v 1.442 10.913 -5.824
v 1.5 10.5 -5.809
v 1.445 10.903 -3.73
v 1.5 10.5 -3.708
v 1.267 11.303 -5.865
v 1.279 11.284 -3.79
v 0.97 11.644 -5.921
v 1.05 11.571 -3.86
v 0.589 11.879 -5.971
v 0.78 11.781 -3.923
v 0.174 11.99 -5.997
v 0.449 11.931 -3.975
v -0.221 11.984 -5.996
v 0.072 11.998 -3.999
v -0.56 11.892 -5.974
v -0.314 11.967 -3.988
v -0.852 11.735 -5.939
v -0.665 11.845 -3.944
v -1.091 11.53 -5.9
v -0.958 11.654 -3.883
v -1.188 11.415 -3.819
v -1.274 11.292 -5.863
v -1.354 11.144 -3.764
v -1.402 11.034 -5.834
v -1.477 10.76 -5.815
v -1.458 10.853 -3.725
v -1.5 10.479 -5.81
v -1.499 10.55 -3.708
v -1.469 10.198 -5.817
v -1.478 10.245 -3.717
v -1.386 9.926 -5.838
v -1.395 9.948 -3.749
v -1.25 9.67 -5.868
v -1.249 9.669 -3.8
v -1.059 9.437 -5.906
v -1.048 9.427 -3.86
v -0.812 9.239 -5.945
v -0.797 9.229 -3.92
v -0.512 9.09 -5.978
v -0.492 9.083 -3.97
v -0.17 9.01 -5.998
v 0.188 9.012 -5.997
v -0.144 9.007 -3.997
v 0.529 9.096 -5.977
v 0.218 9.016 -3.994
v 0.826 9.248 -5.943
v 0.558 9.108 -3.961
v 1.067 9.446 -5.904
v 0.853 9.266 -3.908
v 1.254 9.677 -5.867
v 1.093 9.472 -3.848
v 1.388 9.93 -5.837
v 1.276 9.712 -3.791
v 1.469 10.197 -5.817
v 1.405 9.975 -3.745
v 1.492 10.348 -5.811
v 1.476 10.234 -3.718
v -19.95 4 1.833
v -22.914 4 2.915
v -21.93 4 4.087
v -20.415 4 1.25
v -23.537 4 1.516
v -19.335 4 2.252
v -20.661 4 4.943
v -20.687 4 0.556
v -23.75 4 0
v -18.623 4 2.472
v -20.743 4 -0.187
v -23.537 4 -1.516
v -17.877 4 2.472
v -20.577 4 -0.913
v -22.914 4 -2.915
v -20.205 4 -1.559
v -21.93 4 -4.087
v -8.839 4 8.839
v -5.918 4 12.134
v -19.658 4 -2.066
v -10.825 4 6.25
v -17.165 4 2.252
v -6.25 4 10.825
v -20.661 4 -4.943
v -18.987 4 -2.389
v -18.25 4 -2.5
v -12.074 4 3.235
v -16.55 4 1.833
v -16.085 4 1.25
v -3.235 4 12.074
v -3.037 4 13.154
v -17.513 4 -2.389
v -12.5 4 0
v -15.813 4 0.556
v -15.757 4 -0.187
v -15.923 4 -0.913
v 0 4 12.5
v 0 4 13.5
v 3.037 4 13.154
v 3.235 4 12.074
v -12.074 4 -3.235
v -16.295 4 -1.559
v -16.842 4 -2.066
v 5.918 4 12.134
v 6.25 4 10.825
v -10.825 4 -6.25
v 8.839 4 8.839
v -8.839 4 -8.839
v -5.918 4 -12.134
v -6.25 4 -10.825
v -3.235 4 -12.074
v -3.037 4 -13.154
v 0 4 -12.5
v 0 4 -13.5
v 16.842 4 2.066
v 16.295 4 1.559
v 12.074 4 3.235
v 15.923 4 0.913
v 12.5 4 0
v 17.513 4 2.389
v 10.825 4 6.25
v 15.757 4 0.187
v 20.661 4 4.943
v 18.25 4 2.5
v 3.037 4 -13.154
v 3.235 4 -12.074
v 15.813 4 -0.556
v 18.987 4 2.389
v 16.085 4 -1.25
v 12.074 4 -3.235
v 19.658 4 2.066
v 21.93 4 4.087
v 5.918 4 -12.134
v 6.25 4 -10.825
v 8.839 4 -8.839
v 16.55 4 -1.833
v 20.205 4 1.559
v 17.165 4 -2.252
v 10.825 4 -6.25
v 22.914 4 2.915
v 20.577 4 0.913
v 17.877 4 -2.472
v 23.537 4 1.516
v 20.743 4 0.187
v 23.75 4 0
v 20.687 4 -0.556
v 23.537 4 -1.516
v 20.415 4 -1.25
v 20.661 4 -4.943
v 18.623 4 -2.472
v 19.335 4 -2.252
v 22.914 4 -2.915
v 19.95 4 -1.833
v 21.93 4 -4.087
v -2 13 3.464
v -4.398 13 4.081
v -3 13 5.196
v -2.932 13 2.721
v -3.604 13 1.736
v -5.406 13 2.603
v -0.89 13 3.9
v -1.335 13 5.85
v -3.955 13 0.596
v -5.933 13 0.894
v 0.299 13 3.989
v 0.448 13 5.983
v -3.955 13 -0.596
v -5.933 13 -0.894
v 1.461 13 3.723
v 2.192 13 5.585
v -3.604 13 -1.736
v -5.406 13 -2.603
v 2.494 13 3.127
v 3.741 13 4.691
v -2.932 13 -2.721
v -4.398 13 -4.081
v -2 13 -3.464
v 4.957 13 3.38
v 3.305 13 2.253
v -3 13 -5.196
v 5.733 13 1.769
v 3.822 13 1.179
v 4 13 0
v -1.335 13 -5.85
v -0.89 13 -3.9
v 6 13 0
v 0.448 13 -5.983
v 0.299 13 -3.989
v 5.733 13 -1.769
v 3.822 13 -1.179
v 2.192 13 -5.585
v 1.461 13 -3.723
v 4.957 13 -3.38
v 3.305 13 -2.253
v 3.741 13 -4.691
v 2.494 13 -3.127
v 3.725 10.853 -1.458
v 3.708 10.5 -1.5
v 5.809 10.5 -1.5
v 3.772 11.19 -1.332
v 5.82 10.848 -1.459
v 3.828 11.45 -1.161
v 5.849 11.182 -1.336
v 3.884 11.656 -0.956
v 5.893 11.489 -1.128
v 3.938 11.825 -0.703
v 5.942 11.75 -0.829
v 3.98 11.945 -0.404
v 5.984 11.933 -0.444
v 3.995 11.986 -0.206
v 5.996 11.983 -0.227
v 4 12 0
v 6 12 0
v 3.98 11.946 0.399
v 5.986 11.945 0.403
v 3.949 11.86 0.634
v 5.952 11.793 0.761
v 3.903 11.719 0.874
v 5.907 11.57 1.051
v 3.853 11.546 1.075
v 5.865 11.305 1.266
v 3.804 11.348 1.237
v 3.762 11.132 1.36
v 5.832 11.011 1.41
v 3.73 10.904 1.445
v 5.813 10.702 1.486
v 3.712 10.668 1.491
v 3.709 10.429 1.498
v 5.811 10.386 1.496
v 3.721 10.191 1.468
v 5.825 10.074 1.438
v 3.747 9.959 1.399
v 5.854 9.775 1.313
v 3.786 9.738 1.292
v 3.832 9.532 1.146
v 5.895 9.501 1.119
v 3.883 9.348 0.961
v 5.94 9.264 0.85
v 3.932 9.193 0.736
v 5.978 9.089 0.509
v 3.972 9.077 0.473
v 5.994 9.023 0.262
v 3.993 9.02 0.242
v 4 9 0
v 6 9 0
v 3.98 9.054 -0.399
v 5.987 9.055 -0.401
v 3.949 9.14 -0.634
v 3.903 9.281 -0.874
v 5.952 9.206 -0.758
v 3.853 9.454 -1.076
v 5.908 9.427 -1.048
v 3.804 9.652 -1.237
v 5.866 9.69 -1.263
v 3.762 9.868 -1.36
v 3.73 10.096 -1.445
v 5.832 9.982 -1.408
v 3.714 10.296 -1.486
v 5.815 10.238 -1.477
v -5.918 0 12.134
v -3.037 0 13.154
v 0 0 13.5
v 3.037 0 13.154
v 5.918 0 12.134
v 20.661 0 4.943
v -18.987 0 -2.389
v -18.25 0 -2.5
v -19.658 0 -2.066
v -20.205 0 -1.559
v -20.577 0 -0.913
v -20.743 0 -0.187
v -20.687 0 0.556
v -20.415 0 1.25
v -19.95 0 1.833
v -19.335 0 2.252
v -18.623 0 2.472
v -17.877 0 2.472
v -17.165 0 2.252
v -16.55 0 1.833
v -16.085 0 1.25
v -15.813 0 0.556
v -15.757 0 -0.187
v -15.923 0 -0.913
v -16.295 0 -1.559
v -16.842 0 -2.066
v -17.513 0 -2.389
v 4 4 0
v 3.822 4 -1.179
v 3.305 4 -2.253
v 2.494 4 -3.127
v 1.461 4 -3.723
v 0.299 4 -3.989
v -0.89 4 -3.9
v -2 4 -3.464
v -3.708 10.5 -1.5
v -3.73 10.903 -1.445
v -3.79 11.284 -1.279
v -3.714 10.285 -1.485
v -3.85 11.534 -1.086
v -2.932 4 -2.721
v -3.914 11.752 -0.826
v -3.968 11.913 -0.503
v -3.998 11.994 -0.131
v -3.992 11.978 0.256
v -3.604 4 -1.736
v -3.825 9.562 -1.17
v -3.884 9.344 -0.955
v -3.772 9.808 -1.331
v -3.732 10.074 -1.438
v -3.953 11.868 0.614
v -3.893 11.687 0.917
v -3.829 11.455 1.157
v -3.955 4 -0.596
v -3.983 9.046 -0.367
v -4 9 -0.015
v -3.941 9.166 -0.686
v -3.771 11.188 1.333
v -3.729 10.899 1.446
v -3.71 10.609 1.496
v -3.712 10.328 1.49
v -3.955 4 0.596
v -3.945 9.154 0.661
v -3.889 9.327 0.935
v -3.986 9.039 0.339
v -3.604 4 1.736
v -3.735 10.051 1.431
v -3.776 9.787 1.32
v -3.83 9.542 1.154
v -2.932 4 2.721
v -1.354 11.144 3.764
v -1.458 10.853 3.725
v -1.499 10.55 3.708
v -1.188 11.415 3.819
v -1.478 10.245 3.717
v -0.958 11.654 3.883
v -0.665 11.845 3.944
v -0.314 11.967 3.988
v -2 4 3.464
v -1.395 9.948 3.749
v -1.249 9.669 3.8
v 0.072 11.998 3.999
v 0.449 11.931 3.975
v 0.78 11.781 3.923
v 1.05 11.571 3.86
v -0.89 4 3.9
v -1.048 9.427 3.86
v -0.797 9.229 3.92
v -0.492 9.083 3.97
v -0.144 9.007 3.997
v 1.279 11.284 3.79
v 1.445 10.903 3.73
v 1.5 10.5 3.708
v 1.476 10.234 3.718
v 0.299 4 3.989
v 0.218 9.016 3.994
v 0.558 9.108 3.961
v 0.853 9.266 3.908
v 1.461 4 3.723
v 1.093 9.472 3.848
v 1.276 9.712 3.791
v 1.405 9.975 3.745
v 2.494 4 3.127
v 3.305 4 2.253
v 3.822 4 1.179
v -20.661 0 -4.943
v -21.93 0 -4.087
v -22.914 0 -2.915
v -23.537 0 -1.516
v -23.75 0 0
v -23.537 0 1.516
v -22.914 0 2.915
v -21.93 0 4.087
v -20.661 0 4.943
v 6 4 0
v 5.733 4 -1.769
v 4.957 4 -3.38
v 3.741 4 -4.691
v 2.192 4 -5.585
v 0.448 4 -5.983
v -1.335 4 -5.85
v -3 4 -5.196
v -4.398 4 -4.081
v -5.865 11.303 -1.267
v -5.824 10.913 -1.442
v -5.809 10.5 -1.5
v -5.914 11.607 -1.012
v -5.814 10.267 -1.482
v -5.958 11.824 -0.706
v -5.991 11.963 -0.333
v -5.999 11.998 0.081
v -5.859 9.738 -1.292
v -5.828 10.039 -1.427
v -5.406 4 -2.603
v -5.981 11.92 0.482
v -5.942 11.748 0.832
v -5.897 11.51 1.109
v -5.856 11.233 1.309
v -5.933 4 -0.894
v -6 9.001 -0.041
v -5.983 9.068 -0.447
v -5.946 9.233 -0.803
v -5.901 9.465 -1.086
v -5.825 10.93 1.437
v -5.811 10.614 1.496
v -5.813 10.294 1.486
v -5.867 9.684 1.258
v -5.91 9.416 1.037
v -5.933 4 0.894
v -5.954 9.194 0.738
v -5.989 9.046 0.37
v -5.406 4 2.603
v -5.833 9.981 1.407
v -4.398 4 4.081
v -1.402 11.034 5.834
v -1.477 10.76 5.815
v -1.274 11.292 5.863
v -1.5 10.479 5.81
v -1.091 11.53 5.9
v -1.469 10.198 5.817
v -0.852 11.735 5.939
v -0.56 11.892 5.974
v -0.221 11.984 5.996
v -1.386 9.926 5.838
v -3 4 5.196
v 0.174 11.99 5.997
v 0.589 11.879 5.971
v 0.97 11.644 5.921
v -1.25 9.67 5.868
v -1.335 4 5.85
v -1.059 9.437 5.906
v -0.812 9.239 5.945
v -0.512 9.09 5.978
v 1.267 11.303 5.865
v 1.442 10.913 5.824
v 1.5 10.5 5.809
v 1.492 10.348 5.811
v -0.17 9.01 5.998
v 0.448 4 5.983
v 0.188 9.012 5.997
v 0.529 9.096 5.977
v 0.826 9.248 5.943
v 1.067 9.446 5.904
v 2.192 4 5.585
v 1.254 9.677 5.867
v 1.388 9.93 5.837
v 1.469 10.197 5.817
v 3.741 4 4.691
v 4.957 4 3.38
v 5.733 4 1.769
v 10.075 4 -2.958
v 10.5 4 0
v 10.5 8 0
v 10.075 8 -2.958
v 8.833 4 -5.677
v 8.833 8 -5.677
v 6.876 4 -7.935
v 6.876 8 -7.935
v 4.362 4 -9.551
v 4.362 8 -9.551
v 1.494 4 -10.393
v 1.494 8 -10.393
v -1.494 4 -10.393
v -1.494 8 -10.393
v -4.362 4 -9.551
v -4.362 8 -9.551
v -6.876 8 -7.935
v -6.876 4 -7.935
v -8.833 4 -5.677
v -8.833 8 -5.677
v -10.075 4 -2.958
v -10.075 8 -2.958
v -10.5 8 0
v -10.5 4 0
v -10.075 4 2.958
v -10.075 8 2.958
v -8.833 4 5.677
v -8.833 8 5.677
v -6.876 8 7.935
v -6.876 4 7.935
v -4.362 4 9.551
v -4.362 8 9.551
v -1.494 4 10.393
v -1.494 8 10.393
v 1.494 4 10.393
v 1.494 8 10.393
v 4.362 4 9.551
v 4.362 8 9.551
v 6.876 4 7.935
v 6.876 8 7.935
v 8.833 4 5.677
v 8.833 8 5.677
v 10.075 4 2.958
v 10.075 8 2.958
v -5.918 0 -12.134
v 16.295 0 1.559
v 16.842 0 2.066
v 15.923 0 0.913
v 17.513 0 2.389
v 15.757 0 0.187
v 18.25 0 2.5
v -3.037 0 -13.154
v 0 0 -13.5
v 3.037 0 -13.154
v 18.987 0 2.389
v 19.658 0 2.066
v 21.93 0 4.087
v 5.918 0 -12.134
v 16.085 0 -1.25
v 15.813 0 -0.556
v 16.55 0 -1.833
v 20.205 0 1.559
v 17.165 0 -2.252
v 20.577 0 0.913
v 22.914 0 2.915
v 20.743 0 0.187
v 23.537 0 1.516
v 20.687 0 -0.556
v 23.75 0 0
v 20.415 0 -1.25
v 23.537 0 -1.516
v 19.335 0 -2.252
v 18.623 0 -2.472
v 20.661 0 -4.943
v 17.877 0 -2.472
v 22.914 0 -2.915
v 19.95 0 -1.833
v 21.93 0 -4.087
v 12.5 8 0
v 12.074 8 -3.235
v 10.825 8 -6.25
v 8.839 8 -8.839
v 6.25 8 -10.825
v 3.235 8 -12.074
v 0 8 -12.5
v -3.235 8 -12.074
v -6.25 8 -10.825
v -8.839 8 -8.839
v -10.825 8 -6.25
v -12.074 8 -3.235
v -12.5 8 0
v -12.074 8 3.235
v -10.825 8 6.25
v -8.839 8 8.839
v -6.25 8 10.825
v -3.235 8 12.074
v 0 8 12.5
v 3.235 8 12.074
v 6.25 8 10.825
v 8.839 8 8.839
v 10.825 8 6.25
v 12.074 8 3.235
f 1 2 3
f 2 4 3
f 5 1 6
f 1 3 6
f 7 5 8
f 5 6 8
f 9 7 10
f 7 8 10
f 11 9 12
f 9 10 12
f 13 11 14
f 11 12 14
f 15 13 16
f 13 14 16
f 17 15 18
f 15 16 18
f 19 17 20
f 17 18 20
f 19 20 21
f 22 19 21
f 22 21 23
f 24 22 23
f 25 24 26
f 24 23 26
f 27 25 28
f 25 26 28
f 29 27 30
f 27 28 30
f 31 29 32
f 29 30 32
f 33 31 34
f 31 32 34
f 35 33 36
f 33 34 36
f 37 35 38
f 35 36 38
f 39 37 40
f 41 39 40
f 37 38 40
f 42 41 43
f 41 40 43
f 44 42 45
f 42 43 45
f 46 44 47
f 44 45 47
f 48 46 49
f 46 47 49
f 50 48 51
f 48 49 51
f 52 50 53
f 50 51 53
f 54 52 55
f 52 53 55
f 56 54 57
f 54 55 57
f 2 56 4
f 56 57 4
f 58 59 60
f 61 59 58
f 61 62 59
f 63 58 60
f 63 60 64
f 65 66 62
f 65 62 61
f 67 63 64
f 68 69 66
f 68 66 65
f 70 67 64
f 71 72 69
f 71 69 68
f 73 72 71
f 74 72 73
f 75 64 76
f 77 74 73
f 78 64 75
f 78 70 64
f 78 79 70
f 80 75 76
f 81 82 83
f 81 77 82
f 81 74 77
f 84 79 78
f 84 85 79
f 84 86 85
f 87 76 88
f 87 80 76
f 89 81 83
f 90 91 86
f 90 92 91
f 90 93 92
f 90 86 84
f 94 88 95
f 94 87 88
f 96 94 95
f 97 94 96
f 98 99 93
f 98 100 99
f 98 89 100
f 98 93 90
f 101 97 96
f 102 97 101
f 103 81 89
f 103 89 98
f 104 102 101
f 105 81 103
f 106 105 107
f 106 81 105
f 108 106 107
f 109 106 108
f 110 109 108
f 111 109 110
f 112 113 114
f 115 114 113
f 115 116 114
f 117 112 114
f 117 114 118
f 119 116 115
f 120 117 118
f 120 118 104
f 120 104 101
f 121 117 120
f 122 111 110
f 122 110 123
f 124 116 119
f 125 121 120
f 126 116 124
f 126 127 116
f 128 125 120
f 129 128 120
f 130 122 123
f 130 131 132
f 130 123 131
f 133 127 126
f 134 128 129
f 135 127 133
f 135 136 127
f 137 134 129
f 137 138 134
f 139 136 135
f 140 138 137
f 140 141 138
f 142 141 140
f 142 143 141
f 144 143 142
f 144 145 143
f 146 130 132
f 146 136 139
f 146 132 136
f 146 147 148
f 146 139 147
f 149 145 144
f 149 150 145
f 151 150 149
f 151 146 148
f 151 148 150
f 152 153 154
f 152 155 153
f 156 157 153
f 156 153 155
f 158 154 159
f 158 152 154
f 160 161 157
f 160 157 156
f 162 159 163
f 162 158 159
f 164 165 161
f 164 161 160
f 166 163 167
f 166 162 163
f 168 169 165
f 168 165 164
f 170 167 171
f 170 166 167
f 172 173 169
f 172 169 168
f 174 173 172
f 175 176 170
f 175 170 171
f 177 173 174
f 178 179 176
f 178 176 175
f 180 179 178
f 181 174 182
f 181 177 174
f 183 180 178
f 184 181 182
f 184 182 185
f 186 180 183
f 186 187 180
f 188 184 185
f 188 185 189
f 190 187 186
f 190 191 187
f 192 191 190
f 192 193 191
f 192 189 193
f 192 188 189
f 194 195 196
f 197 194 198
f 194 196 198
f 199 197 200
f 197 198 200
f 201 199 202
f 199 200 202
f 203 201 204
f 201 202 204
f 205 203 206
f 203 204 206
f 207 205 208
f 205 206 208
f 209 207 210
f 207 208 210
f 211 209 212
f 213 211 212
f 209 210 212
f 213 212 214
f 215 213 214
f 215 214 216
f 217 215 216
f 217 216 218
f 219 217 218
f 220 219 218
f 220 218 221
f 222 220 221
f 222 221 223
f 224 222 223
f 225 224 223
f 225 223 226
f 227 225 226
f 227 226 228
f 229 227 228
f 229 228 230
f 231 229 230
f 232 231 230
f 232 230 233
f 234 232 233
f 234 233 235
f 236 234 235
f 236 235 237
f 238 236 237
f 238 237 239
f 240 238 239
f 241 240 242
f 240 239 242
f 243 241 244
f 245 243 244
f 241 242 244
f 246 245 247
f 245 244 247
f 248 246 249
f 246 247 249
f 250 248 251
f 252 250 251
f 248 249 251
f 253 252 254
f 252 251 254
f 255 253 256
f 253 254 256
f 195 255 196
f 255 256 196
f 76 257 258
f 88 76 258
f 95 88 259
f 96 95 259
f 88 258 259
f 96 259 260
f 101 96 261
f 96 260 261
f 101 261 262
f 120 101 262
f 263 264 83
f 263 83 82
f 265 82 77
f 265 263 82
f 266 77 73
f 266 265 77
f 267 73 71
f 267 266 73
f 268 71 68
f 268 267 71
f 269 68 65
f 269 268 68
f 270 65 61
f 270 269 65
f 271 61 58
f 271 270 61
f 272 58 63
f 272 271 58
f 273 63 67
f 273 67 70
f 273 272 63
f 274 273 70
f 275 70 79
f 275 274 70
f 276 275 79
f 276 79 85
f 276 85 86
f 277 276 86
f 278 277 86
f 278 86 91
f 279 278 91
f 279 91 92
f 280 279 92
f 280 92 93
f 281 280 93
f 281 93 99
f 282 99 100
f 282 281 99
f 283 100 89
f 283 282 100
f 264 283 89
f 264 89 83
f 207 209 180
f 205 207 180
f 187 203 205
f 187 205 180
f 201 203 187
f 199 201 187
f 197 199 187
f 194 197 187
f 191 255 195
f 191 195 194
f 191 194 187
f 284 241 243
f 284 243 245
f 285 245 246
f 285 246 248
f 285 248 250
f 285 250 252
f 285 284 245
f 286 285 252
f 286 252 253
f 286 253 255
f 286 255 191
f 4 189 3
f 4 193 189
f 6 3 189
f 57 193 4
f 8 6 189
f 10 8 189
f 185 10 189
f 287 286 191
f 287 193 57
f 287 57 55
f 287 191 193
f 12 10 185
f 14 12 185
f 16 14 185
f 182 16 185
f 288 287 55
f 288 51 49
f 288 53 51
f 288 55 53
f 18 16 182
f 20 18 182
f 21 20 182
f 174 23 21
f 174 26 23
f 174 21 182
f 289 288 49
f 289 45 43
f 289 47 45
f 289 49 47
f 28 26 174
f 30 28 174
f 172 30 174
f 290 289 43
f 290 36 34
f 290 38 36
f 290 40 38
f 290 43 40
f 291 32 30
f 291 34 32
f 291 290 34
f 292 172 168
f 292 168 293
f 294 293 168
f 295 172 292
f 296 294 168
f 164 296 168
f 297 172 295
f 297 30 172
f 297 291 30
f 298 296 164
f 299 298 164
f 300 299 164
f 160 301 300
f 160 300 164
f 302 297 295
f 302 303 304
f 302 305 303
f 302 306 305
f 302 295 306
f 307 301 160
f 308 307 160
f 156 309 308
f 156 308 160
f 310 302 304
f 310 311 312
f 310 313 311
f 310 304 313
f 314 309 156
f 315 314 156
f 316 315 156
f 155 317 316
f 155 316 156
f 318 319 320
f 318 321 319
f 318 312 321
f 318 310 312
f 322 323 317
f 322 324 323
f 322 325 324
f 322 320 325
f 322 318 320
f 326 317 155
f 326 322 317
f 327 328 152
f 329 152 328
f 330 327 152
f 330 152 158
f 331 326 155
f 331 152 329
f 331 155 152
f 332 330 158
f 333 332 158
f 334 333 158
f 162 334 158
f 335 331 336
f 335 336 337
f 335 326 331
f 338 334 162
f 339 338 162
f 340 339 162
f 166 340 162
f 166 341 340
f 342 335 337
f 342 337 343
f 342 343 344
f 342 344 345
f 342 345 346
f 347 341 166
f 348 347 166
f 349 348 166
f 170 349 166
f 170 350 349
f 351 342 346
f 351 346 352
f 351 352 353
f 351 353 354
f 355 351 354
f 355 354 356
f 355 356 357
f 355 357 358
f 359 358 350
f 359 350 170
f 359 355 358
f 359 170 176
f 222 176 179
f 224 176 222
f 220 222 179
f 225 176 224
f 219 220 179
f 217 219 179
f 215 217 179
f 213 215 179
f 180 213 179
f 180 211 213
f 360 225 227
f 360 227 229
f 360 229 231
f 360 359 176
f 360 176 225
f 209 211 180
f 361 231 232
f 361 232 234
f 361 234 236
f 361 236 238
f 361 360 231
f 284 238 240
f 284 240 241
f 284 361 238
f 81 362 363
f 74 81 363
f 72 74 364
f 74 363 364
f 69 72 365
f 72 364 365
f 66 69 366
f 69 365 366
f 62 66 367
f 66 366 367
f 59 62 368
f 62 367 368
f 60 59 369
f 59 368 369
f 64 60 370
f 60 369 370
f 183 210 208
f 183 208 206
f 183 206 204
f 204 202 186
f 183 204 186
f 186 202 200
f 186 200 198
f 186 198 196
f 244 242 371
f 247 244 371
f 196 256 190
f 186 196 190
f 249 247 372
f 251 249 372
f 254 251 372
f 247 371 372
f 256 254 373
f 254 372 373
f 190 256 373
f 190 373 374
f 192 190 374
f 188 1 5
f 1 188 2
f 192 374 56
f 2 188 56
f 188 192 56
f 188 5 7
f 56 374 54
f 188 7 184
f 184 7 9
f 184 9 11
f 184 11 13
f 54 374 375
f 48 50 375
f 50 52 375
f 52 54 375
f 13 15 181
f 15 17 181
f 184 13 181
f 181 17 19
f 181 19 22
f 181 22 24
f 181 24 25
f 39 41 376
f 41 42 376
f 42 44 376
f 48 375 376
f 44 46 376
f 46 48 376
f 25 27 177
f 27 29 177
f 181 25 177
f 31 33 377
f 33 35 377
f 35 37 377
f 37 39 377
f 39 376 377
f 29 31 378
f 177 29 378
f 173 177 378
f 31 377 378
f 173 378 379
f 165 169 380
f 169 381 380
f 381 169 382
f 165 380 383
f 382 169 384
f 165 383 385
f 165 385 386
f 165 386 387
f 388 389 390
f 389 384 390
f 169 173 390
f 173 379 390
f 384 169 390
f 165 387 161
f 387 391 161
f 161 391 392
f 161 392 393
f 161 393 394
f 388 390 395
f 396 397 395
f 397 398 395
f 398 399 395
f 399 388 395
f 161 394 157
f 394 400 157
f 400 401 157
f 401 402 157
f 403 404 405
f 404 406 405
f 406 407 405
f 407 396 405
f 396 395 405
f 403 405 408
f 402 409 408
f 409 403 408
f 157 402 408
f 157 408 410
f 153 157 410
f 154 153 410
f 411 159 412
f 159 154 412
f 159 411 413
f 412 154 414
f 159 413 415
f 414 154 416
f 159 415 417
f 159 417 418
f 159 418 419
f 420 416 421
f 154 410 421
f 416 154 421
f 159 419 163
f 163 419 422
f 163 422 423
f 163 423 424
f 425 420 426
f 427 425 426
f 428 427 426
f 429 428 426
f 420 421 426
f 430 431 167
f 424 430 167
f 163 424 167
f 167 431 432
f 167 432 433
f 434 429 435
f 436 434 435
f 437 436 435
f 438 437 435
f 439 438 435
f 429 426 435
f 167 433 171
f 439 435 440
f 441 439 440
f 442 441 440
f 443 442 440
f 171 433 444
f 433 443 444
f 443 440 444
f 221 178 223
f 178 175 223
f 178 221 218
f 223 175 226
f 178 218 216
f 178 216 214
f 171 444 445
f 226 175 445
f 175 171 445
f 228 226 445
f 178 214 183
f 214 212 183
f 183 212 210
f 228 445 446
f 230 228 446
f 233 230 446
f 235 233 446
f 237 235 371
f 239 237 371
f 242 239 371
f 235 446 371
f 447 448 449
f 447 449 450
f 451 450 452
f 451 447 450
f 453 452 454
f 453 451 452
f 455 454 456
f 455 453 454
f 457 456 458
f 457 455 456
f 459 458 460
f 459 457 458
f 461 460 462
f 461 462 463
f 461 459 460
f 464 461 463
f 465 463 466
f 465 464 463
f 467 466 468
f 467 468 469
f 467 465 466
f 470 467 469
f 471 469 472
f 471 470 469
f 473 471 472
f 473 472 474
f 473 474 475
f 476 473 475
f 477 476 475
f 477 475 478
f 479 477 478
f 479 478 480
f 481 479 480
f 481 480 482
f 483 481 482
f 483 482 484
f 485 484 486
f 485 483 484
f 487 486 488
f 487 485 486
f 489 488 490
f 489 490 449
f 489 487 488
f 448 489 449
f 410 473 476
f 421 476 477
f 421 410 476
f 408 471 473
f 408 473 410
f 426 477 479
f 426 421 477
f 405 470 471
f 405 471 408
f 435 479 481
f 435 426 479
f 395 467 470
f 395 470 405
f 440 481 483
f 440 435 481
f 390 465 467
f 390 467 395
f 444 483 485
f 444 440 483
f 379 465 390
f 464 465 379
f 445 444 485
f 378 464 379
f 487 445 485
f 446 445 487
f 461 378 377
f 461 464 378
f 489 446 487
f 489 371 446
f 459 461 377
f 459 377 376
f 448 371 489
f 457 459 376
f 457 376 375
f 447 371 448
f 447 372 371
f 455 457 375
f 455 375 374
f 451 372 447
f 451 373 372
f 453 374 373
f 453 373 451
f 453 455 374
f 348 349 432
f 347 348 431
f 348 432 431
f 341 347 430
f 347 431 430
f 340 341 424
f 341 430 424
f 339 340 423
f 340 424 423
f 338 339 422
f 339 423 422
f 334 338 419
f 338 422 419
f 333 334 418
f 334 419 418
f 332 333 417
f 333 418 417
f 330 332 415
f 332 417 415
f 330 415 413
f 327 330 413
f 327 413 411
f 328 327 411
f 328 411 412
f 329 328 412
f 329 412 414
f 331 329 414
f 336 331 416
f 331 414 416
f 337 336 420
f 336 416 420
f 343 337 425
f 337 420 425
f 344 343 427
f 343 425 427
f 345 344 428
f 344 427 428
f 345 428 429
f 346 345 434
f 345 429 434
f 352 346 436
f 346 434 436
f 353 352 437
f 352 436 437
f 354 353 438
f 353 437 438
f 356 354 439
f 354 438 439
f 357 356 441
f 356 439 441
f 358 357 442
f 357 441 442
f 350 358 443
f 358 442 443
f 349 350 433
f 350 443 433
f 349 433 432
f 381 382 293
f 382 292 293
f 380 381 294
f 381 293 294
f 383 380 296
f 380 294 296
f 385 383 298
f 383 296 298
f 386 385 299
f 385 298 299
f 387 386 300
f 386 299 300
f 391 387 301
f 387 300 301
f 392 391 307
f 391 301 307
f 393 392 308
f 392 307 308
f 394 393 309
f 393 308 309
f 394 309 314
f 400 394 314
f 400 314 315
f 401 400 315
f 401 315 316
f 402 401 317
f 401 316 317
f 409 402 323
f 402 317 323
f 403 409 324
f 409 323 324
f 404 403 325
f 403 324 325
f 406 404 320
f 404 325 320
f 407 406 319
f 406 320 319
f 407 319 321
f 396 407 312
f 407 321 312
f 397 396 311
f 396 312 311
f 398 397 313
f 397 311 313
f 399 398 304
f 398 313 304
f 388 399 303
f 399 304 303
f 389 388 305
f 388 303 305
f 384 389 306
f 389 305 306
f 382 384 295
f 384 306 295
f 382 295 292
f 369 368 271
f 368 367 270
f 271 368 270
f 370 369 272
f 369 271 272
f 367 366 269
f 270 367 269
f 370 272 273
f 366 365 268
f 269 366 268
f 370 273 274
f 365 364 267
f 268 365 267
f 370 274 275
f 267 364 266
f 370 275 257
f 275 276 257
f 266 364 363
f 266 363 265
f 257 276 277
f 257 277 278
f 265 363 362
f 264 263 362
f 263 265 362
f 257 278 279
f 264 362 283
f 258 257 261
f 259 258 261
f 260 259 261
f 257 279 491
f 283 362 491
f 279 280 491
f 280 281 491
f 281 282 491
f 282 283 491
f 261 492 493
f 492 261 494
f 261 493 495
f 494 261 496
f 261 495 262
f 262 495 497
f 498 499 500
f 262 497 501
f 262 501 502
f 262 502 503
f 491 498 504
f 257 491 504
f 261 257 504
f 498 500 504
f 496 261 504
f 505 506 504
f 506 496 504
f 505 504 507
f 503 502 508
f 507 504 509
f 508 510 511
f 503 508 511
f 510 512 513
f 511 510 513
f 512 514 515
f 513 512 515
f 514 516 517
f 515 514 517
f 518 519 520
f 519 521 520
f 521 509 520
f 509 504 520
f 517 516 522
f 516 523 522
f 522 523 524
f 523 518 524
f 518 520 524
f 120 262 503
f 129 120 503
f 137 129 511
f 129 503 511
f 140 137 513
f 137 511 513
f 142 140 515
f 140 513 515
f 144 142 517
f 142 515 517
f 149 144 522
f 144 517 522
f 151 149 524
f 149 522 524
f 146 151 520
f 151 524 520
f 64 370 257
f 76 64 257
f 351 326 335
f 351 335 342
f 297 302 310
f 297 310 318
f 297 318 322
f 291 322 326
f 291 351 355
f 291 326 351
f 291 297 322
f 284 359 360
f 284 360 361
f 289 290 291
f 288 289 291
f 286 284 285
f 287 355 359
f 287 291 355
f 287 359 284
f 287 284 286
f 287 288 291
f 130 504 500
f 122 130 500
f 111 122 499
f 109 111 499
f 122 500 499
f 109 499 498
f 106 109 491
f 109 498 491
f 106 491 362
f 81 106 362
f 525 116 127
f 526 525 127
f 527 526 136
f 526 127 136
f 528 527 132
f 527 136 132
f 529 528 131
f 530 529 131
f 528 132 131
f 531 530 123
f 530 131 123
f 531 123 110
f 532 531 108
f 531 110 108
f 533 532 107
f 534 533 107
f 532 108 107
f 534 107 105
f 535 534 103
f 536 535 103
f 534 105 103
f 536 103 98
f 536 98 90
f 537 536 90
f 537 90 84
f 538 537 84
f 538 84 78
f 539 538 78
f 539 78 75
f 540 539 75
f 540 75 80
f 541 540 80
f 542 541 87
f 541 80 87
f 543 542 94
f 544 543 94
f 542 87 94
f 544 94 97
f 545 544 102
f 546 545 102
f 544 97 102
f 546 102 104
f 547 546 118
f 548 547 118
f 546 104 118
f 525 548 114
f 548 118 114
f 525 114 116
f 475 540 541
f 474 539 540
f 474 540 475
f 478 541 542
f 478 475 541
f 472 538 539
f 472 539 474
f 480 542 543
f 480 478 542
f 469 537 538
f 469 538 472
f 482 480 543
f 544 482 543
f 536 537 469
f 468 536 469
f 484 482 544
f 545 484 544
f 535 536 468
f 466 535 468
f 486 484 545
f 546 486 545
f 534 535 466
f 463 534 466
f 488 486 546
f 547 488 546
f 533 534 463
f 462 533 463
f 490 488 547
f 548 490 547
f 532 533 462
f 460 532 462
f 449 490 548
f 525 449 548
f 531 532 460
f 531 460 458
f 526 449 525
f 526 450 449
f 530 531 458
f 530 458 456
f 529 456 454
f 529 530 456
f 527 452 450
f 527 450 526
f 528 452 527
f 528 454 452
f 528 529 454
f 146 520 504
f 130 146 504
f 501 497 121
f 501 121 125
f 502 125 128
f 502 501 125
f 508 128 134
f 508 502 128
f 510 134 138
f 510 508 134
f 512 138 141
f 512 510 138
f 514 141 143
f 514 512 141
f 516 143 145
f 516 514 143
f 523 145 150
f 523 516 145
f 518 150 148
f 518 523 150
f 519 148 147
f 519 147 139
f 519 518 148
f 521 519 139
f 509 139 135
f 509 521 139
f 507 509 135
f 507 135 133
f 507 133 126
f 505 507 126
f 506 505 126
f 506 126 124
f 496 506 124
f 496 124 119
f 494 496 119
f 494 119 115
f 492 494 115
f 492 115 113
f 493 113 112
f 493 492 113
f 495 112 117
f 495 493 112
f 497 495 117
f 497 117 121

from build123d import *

# Parameters (mm, degrees)
SKETCH1_R           = 2.5
BOSS_EXTRUDE1_DEPTH = 4
SKETCH2_R           = 12.5
SKETCH2_R_2         = 10.5
EXTRUDE_THIN1_DEPTH = 4
SKETCH3_R           = 6
SKETCH3_R_2         = 4
EXTRUDE_THIN2_DEPTH = 9
SKETCH4_R           = 1.5
CUT_EXTRUDE1_DEPTH  = 31.254131949
CIRPATTERN1_COUNT   = 2
CIRPATTERN1_ANGLE   = 90


with BuildPart() as part:
    # Sketch1 → Boss-Extrude1 (new body)
    with BuildSketch(Plane(origin=(0, 0, 0), x_dir=(1, 0, 0), z_dir=(0, 1, 0))):
        with BuildLine():
            Line((20.660958904, 4.943407445), (5.917808219, 12.133818273))
            ThreePointArc((5.917808219, 12.133818273), (0, 13.5), (-5.917808219, 12.133818273))
            Line((-5.917808219, 12.133818273), (-20.660958904, 4.943407445))
            ThreePointArc((-20.660958904, 4.943407445), (-23.75, 0), (-20.660958904, -4.943407445))
            Line((-20.660958904, -4.943407445), (-5.917808219, -12.133818273))
            ThreePointArc((-5.917808219, -12.133818273), (0, -13.5), (5.917808219, -12.133818273))
            Line((5.917808219, -12.133818273), (20.660958904, -4.943407445))
            ThreePointArc((20.660958904, -4.943407445), (23.75, 0), (20.660958904, 4.943407445))
        make_face()
        with Locations(Location((18.25, 0, 0), (0, 0, 270))):
            Circle(SKETCH1_R, mode=Mode.SUBTRACT)
        with Locations(Location((-18.25, 0, 0), (0, 0, 90))):
            Circle(SKETCH1_R, mode=Mode.SUBTRACT)
    extrude(amount=BOSS_EXTRUDE1_DEPTH)

    # Sketch2 → Extrude-Thin1 (add)
    with BuildSketch(Plane(origin=(0, 4, 0), x_dir=(1, 0, 0), z_dir=(0, 1, 0))):
        Circle(SKETCH2_R)
        Circle(SKETCH2_R_2, mode=Mode.SUBTRACT)
    extrude(amount=EXTRUDE_THIN1_DEPTH)

    # Sketch3 → Extrude-Thin2 (add)
    with BuildSketch(Plane(origin=(0, 4, 0), x_dir=(1, 0, 0), z_dir=(0, 1, 0))):
        Circle(SKETCH3_R)
        Circle(SKETCH3_R_2, mode=Mode.SUBTRACT)
    extrude(amount=EXTRUDE_THIN2_DEPTH)

    # Sketch4 → Cut-Extrude1 (cut, symmetric)
    with BuildSketch(Plane.XY):
        with Locations((0, 10.5)):
            Circle(SKETCH4_R)
    cut_extrude1 = extrude(amount=CUT_EXTRUDE1_DEPTH, both=True, mode=Mode.SUBTRACT)

    # CirPattern1: Cut-Extrude1 ×2 about axis
    cirpattern1_axis = Axis((0, 13, 0), (0, 1, 0))
    for i in range(1, CIRPATTERN1_COUNT):
        add(cut_extrude1.rotate(cirpattern1_axis, i * CIRPATTERN1_ANGLE / (CIRPATTERN1_COUNT - 1)), mode=Mode.SUBTRACT)


solid = part.part
